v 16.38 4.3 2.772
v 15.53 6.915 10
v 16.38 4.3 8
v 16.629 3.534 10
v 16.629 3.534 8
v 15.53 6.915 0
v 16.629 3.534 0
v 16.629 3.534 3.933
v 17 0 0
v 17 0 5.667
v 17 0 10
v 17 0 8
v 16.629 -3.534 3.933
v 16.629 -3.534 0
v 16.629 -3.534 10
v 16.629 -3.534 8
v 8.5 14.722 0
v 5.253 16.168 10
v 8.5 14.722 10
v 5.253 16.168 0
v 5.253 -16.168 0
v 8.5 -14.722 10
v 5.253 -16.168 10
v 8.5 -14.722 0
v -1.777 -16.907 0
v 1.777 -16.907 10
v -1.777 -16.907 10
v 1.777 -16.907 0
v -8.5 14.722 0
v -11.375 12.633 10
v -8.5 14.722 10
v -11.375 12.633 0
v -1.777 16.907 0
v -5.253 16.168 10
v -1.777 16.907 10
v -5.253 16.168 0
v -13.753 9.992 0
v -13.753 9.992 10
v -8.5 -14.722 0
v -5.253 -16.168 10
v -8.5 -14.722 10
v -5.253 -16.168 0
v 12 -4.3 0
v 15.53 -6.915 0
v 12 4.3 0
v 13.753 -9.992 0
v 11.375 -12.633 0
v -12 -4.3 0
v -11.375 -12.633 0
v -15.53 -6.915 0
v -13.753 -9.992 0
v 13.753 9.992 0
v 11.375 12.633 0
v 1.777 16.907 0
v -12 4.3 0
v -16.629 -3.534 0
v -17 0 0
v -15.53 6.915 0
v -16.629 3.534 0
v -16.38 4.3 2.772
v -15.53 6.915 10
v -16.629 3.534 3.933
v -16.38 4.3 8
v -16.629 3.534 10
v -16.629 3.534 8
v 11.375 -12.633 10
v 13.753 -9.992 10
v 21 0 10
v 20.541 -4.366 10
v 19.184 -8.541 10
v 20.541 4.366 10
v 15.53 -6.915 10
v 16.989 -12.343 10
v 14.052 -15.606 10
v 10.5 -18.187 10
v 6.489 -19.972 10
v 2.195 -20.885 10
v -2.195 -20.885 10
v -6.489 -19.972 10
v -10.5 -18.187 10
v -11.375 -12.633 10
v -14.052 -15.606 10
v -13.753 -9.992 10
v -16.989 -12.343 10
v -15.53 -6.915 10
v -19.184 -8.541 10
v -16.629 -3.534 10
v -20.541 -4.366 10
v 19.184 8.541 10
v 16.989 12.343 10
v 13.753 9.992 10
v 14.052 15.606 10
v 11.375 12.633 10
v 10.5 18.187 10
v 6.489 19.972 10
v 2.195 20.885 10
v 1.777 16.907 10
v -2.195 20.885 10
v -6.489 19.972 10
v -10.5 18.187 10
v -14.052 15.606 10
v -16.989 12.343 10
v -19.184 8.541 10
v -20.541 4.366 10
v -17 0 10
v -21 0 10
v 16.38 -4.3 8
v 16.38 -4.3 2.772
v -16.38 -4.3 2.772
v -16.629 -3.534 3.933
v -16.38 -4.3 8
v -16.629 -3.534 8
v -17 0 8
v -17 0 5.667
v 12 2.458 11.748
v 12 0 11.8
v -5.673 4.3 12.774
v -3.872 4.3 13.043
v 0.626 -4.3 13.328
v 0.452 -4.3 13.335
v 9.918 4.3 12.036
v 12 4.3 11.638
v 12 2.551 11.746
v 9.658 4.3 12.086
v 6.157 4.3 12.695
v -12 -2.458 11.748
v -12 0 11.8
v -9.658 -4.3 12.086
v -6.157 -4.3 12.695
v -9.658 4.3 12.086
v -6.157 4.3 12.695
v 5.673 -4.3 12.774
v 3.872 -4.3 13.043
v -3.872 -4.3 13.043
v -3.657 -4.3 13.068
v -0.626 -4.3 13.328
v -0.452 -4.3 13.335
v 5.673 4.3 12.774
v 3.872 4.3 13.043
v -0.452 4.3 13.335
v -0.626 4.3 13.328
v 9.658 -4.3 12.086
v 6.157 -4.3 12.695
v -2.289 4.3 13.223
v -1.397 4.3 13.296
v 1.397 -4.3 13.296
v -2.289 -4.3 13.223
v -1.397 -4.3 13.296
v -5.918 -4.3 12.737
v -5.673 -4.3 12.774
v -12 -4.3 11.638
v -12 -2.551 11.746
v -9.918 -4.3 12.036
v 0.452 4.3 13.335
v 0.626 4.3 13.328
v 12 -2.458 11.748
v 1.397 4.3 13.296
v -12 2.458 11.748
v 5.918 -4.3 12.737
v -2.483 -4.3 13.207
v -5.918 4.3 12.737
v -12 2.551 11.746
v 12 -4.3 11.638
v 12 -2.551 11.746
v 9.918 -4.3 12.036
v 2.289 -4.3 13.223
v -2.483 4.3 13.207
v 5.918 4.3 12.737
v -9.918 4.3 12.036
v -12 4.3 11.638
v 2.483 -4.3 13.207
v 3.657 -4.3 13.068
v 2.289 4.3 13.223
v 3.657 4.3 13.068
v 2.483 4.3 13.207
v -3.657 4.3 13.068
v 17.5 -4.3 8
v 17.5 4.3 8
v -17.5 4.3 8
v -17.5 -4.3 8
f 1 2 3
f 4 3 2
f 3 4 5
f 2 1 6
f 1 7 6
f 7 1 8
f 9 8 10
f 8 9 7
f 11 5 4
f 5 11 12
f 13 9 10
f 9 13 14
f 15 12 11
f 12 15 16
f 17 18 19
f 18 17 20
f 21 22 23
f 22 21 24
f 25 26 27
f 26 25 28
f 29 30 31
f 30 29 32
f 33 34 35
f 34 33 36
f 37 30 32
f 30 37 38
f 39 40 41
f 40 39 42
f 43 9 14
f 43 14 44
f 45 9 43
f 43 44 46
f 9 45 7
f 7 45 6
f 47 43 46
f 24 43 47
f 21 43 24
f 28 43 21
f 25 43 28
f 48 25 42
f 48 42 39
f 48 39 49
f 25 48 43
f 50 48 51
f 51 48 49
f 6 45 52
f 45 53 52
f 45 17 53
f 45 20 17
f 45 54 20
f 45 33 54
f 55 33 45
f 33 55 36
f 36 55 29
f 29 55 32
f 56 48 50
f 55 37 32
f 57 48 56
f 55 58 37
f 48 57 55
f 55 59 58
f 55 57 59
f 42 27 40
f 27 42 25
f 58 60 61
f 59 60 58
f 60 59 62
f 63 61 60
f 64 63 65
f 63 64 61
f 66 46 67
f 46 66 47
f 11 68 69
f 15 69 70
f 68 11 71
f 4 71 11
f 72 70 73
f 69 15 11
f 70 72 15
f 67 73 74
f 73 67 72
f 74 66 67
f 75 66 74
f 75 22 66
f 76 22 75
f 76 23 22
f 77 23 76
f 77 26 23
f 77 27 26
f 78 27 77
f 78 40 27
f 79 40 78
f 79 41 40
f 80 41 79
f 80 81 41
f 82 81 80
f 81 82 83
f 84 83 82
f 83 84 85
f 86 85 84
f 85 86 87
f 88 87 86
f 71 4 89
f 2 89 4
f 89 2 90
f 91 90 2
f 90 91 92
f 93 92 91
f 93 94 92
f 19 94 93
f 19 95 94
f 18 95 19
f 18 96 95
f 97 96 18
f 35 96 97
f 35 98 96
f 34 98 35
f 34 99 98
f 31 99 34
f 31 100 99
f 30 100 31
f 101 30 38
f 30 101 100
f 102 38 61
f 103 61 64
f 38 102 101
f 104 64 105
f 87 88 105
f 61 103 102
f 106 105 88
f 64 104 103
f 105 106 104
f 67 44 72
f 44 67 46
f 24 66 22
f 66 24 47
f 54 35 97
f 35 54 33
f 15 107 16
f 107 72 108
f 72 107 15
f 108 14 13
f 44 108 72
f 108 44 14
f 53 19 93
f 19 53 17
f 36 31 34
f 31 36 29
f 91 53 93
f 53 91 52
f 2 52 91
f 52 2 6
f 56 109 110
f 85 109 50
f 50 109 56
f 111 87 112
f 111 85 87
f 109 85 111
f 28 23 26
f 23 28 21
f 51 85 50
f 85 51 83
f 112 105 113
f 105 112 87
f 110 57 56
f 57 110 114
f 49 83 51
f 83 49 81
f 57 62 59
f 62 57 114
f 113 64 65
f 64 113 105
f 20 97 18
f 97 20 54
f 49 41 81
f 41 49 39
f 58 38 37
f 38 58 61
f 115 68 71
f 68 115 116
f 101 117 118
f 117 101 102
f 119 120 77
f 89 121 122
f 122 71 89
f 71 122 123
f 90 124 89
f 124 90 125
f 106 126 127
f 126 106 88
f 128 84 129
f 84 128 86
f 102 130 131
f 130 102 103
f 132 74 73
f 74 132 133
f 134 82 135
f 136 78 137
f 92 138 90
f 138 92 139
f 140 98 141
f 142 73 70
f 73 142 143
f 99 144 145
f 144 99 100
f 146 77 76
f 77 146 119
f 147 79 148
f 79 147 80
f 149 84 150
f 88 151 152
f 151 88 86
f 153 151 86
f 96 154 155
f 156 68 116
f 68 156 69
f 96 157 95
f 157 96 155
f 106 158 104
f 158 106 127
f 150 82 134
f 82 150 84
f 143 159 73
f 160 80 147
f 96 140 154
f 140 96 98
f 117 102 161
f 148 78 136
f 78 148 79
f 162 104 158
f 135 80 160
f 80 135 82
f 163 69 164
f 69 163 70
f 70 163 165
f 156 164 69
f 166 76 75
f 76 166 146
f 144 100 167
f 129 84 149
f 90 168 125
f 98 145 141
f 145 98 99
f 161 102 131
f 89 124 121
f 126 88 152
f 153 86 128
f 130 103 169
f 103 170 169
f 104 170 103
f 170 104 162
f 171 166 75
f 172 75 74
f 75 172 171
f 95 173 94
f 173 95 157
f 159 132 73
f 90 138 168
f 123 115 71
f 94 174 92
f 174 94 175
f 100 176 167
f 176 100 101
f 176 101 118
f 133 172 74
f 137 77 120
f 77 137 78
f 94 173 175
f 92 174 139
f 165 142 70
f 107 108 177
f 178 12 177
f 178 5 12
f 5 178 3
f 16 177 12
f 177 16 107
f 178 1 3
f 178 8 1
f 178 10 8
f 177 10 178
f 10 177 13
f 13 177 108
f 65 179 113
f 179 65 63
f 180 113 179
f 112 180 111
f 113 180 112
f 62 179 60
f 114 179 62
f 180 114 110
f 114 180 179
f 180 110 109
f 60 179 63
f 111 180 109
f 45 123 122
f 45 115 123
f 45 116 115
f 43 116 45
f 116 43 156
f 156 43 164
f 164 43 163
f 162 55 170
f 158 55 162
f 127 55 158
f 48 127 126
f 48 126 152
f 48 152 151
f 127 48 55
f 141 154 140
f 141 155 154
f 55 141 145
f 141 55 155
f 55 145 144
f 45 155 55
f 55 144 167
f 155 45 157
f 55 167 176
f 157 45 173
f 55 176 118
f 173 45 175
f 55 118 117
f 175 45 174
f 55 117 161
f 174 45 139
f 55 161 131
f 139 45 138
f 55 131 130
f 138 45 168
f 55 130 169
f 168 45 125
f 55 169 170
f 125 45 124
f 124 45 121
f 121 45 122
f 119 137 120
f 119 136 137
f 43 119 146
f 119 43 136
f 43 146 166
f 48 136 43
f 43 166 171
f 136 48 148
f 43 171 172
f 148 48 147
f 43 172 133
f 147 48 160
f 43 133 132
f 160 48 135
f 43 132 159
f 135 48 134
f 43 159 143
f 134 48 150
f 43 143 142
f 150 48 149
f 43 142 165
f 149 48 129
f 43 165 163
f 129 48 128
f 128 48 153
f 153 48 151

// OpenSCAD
holeh = 8.6;
plugh = 10;
clips = 16;
clipe = 17.5;
difference(){
  union(){
    cylinder(plugh, r=17, true);
    translate([0, 0, 10]){
        cylinder(4, 21, true);
    }
    polyhedron(
      [[clips, holeh / 2, 1],
       [clips, holeh / 2, plugh - 2],
       [clips, -holeh / 2, 1],
       [clips, -holeh / 2, plugh - 2],
       [clipe, holeh / 2, plugh - 2],
       [clipe, -holeh / 2, plugh - 2]],
      [[1, 4, 5, 3], // facing top
       [5, 4, 0, 2], // inclined plane
       [0, 1, 3, 2], // back
       // side triangles
       [0, 4, 1],
       [2, 3, 5]]
    );
    polyhedron(
      [[-clips, holeh / 2, 1],
       [-clips, holeh / 2, plugh - 2],
       [-clips, -holeh / 2, 1],
       [-clips, -holeh / 2, plugh - 2],
       [-clipe, holeh / 2, plugh - 2],
       [-clipe, -holeh / 2, plugh - 2]],
      [[1, 4, 5, 3], // facing top
       [5, 4, 0, 2], // inclined plane
       [0, 1, 3, 2], // back
       // side triangles
       [0, 4, 1],
       [2, 3, 5]]
    );
  }
  cube([24, holeh, 50], true);
}
